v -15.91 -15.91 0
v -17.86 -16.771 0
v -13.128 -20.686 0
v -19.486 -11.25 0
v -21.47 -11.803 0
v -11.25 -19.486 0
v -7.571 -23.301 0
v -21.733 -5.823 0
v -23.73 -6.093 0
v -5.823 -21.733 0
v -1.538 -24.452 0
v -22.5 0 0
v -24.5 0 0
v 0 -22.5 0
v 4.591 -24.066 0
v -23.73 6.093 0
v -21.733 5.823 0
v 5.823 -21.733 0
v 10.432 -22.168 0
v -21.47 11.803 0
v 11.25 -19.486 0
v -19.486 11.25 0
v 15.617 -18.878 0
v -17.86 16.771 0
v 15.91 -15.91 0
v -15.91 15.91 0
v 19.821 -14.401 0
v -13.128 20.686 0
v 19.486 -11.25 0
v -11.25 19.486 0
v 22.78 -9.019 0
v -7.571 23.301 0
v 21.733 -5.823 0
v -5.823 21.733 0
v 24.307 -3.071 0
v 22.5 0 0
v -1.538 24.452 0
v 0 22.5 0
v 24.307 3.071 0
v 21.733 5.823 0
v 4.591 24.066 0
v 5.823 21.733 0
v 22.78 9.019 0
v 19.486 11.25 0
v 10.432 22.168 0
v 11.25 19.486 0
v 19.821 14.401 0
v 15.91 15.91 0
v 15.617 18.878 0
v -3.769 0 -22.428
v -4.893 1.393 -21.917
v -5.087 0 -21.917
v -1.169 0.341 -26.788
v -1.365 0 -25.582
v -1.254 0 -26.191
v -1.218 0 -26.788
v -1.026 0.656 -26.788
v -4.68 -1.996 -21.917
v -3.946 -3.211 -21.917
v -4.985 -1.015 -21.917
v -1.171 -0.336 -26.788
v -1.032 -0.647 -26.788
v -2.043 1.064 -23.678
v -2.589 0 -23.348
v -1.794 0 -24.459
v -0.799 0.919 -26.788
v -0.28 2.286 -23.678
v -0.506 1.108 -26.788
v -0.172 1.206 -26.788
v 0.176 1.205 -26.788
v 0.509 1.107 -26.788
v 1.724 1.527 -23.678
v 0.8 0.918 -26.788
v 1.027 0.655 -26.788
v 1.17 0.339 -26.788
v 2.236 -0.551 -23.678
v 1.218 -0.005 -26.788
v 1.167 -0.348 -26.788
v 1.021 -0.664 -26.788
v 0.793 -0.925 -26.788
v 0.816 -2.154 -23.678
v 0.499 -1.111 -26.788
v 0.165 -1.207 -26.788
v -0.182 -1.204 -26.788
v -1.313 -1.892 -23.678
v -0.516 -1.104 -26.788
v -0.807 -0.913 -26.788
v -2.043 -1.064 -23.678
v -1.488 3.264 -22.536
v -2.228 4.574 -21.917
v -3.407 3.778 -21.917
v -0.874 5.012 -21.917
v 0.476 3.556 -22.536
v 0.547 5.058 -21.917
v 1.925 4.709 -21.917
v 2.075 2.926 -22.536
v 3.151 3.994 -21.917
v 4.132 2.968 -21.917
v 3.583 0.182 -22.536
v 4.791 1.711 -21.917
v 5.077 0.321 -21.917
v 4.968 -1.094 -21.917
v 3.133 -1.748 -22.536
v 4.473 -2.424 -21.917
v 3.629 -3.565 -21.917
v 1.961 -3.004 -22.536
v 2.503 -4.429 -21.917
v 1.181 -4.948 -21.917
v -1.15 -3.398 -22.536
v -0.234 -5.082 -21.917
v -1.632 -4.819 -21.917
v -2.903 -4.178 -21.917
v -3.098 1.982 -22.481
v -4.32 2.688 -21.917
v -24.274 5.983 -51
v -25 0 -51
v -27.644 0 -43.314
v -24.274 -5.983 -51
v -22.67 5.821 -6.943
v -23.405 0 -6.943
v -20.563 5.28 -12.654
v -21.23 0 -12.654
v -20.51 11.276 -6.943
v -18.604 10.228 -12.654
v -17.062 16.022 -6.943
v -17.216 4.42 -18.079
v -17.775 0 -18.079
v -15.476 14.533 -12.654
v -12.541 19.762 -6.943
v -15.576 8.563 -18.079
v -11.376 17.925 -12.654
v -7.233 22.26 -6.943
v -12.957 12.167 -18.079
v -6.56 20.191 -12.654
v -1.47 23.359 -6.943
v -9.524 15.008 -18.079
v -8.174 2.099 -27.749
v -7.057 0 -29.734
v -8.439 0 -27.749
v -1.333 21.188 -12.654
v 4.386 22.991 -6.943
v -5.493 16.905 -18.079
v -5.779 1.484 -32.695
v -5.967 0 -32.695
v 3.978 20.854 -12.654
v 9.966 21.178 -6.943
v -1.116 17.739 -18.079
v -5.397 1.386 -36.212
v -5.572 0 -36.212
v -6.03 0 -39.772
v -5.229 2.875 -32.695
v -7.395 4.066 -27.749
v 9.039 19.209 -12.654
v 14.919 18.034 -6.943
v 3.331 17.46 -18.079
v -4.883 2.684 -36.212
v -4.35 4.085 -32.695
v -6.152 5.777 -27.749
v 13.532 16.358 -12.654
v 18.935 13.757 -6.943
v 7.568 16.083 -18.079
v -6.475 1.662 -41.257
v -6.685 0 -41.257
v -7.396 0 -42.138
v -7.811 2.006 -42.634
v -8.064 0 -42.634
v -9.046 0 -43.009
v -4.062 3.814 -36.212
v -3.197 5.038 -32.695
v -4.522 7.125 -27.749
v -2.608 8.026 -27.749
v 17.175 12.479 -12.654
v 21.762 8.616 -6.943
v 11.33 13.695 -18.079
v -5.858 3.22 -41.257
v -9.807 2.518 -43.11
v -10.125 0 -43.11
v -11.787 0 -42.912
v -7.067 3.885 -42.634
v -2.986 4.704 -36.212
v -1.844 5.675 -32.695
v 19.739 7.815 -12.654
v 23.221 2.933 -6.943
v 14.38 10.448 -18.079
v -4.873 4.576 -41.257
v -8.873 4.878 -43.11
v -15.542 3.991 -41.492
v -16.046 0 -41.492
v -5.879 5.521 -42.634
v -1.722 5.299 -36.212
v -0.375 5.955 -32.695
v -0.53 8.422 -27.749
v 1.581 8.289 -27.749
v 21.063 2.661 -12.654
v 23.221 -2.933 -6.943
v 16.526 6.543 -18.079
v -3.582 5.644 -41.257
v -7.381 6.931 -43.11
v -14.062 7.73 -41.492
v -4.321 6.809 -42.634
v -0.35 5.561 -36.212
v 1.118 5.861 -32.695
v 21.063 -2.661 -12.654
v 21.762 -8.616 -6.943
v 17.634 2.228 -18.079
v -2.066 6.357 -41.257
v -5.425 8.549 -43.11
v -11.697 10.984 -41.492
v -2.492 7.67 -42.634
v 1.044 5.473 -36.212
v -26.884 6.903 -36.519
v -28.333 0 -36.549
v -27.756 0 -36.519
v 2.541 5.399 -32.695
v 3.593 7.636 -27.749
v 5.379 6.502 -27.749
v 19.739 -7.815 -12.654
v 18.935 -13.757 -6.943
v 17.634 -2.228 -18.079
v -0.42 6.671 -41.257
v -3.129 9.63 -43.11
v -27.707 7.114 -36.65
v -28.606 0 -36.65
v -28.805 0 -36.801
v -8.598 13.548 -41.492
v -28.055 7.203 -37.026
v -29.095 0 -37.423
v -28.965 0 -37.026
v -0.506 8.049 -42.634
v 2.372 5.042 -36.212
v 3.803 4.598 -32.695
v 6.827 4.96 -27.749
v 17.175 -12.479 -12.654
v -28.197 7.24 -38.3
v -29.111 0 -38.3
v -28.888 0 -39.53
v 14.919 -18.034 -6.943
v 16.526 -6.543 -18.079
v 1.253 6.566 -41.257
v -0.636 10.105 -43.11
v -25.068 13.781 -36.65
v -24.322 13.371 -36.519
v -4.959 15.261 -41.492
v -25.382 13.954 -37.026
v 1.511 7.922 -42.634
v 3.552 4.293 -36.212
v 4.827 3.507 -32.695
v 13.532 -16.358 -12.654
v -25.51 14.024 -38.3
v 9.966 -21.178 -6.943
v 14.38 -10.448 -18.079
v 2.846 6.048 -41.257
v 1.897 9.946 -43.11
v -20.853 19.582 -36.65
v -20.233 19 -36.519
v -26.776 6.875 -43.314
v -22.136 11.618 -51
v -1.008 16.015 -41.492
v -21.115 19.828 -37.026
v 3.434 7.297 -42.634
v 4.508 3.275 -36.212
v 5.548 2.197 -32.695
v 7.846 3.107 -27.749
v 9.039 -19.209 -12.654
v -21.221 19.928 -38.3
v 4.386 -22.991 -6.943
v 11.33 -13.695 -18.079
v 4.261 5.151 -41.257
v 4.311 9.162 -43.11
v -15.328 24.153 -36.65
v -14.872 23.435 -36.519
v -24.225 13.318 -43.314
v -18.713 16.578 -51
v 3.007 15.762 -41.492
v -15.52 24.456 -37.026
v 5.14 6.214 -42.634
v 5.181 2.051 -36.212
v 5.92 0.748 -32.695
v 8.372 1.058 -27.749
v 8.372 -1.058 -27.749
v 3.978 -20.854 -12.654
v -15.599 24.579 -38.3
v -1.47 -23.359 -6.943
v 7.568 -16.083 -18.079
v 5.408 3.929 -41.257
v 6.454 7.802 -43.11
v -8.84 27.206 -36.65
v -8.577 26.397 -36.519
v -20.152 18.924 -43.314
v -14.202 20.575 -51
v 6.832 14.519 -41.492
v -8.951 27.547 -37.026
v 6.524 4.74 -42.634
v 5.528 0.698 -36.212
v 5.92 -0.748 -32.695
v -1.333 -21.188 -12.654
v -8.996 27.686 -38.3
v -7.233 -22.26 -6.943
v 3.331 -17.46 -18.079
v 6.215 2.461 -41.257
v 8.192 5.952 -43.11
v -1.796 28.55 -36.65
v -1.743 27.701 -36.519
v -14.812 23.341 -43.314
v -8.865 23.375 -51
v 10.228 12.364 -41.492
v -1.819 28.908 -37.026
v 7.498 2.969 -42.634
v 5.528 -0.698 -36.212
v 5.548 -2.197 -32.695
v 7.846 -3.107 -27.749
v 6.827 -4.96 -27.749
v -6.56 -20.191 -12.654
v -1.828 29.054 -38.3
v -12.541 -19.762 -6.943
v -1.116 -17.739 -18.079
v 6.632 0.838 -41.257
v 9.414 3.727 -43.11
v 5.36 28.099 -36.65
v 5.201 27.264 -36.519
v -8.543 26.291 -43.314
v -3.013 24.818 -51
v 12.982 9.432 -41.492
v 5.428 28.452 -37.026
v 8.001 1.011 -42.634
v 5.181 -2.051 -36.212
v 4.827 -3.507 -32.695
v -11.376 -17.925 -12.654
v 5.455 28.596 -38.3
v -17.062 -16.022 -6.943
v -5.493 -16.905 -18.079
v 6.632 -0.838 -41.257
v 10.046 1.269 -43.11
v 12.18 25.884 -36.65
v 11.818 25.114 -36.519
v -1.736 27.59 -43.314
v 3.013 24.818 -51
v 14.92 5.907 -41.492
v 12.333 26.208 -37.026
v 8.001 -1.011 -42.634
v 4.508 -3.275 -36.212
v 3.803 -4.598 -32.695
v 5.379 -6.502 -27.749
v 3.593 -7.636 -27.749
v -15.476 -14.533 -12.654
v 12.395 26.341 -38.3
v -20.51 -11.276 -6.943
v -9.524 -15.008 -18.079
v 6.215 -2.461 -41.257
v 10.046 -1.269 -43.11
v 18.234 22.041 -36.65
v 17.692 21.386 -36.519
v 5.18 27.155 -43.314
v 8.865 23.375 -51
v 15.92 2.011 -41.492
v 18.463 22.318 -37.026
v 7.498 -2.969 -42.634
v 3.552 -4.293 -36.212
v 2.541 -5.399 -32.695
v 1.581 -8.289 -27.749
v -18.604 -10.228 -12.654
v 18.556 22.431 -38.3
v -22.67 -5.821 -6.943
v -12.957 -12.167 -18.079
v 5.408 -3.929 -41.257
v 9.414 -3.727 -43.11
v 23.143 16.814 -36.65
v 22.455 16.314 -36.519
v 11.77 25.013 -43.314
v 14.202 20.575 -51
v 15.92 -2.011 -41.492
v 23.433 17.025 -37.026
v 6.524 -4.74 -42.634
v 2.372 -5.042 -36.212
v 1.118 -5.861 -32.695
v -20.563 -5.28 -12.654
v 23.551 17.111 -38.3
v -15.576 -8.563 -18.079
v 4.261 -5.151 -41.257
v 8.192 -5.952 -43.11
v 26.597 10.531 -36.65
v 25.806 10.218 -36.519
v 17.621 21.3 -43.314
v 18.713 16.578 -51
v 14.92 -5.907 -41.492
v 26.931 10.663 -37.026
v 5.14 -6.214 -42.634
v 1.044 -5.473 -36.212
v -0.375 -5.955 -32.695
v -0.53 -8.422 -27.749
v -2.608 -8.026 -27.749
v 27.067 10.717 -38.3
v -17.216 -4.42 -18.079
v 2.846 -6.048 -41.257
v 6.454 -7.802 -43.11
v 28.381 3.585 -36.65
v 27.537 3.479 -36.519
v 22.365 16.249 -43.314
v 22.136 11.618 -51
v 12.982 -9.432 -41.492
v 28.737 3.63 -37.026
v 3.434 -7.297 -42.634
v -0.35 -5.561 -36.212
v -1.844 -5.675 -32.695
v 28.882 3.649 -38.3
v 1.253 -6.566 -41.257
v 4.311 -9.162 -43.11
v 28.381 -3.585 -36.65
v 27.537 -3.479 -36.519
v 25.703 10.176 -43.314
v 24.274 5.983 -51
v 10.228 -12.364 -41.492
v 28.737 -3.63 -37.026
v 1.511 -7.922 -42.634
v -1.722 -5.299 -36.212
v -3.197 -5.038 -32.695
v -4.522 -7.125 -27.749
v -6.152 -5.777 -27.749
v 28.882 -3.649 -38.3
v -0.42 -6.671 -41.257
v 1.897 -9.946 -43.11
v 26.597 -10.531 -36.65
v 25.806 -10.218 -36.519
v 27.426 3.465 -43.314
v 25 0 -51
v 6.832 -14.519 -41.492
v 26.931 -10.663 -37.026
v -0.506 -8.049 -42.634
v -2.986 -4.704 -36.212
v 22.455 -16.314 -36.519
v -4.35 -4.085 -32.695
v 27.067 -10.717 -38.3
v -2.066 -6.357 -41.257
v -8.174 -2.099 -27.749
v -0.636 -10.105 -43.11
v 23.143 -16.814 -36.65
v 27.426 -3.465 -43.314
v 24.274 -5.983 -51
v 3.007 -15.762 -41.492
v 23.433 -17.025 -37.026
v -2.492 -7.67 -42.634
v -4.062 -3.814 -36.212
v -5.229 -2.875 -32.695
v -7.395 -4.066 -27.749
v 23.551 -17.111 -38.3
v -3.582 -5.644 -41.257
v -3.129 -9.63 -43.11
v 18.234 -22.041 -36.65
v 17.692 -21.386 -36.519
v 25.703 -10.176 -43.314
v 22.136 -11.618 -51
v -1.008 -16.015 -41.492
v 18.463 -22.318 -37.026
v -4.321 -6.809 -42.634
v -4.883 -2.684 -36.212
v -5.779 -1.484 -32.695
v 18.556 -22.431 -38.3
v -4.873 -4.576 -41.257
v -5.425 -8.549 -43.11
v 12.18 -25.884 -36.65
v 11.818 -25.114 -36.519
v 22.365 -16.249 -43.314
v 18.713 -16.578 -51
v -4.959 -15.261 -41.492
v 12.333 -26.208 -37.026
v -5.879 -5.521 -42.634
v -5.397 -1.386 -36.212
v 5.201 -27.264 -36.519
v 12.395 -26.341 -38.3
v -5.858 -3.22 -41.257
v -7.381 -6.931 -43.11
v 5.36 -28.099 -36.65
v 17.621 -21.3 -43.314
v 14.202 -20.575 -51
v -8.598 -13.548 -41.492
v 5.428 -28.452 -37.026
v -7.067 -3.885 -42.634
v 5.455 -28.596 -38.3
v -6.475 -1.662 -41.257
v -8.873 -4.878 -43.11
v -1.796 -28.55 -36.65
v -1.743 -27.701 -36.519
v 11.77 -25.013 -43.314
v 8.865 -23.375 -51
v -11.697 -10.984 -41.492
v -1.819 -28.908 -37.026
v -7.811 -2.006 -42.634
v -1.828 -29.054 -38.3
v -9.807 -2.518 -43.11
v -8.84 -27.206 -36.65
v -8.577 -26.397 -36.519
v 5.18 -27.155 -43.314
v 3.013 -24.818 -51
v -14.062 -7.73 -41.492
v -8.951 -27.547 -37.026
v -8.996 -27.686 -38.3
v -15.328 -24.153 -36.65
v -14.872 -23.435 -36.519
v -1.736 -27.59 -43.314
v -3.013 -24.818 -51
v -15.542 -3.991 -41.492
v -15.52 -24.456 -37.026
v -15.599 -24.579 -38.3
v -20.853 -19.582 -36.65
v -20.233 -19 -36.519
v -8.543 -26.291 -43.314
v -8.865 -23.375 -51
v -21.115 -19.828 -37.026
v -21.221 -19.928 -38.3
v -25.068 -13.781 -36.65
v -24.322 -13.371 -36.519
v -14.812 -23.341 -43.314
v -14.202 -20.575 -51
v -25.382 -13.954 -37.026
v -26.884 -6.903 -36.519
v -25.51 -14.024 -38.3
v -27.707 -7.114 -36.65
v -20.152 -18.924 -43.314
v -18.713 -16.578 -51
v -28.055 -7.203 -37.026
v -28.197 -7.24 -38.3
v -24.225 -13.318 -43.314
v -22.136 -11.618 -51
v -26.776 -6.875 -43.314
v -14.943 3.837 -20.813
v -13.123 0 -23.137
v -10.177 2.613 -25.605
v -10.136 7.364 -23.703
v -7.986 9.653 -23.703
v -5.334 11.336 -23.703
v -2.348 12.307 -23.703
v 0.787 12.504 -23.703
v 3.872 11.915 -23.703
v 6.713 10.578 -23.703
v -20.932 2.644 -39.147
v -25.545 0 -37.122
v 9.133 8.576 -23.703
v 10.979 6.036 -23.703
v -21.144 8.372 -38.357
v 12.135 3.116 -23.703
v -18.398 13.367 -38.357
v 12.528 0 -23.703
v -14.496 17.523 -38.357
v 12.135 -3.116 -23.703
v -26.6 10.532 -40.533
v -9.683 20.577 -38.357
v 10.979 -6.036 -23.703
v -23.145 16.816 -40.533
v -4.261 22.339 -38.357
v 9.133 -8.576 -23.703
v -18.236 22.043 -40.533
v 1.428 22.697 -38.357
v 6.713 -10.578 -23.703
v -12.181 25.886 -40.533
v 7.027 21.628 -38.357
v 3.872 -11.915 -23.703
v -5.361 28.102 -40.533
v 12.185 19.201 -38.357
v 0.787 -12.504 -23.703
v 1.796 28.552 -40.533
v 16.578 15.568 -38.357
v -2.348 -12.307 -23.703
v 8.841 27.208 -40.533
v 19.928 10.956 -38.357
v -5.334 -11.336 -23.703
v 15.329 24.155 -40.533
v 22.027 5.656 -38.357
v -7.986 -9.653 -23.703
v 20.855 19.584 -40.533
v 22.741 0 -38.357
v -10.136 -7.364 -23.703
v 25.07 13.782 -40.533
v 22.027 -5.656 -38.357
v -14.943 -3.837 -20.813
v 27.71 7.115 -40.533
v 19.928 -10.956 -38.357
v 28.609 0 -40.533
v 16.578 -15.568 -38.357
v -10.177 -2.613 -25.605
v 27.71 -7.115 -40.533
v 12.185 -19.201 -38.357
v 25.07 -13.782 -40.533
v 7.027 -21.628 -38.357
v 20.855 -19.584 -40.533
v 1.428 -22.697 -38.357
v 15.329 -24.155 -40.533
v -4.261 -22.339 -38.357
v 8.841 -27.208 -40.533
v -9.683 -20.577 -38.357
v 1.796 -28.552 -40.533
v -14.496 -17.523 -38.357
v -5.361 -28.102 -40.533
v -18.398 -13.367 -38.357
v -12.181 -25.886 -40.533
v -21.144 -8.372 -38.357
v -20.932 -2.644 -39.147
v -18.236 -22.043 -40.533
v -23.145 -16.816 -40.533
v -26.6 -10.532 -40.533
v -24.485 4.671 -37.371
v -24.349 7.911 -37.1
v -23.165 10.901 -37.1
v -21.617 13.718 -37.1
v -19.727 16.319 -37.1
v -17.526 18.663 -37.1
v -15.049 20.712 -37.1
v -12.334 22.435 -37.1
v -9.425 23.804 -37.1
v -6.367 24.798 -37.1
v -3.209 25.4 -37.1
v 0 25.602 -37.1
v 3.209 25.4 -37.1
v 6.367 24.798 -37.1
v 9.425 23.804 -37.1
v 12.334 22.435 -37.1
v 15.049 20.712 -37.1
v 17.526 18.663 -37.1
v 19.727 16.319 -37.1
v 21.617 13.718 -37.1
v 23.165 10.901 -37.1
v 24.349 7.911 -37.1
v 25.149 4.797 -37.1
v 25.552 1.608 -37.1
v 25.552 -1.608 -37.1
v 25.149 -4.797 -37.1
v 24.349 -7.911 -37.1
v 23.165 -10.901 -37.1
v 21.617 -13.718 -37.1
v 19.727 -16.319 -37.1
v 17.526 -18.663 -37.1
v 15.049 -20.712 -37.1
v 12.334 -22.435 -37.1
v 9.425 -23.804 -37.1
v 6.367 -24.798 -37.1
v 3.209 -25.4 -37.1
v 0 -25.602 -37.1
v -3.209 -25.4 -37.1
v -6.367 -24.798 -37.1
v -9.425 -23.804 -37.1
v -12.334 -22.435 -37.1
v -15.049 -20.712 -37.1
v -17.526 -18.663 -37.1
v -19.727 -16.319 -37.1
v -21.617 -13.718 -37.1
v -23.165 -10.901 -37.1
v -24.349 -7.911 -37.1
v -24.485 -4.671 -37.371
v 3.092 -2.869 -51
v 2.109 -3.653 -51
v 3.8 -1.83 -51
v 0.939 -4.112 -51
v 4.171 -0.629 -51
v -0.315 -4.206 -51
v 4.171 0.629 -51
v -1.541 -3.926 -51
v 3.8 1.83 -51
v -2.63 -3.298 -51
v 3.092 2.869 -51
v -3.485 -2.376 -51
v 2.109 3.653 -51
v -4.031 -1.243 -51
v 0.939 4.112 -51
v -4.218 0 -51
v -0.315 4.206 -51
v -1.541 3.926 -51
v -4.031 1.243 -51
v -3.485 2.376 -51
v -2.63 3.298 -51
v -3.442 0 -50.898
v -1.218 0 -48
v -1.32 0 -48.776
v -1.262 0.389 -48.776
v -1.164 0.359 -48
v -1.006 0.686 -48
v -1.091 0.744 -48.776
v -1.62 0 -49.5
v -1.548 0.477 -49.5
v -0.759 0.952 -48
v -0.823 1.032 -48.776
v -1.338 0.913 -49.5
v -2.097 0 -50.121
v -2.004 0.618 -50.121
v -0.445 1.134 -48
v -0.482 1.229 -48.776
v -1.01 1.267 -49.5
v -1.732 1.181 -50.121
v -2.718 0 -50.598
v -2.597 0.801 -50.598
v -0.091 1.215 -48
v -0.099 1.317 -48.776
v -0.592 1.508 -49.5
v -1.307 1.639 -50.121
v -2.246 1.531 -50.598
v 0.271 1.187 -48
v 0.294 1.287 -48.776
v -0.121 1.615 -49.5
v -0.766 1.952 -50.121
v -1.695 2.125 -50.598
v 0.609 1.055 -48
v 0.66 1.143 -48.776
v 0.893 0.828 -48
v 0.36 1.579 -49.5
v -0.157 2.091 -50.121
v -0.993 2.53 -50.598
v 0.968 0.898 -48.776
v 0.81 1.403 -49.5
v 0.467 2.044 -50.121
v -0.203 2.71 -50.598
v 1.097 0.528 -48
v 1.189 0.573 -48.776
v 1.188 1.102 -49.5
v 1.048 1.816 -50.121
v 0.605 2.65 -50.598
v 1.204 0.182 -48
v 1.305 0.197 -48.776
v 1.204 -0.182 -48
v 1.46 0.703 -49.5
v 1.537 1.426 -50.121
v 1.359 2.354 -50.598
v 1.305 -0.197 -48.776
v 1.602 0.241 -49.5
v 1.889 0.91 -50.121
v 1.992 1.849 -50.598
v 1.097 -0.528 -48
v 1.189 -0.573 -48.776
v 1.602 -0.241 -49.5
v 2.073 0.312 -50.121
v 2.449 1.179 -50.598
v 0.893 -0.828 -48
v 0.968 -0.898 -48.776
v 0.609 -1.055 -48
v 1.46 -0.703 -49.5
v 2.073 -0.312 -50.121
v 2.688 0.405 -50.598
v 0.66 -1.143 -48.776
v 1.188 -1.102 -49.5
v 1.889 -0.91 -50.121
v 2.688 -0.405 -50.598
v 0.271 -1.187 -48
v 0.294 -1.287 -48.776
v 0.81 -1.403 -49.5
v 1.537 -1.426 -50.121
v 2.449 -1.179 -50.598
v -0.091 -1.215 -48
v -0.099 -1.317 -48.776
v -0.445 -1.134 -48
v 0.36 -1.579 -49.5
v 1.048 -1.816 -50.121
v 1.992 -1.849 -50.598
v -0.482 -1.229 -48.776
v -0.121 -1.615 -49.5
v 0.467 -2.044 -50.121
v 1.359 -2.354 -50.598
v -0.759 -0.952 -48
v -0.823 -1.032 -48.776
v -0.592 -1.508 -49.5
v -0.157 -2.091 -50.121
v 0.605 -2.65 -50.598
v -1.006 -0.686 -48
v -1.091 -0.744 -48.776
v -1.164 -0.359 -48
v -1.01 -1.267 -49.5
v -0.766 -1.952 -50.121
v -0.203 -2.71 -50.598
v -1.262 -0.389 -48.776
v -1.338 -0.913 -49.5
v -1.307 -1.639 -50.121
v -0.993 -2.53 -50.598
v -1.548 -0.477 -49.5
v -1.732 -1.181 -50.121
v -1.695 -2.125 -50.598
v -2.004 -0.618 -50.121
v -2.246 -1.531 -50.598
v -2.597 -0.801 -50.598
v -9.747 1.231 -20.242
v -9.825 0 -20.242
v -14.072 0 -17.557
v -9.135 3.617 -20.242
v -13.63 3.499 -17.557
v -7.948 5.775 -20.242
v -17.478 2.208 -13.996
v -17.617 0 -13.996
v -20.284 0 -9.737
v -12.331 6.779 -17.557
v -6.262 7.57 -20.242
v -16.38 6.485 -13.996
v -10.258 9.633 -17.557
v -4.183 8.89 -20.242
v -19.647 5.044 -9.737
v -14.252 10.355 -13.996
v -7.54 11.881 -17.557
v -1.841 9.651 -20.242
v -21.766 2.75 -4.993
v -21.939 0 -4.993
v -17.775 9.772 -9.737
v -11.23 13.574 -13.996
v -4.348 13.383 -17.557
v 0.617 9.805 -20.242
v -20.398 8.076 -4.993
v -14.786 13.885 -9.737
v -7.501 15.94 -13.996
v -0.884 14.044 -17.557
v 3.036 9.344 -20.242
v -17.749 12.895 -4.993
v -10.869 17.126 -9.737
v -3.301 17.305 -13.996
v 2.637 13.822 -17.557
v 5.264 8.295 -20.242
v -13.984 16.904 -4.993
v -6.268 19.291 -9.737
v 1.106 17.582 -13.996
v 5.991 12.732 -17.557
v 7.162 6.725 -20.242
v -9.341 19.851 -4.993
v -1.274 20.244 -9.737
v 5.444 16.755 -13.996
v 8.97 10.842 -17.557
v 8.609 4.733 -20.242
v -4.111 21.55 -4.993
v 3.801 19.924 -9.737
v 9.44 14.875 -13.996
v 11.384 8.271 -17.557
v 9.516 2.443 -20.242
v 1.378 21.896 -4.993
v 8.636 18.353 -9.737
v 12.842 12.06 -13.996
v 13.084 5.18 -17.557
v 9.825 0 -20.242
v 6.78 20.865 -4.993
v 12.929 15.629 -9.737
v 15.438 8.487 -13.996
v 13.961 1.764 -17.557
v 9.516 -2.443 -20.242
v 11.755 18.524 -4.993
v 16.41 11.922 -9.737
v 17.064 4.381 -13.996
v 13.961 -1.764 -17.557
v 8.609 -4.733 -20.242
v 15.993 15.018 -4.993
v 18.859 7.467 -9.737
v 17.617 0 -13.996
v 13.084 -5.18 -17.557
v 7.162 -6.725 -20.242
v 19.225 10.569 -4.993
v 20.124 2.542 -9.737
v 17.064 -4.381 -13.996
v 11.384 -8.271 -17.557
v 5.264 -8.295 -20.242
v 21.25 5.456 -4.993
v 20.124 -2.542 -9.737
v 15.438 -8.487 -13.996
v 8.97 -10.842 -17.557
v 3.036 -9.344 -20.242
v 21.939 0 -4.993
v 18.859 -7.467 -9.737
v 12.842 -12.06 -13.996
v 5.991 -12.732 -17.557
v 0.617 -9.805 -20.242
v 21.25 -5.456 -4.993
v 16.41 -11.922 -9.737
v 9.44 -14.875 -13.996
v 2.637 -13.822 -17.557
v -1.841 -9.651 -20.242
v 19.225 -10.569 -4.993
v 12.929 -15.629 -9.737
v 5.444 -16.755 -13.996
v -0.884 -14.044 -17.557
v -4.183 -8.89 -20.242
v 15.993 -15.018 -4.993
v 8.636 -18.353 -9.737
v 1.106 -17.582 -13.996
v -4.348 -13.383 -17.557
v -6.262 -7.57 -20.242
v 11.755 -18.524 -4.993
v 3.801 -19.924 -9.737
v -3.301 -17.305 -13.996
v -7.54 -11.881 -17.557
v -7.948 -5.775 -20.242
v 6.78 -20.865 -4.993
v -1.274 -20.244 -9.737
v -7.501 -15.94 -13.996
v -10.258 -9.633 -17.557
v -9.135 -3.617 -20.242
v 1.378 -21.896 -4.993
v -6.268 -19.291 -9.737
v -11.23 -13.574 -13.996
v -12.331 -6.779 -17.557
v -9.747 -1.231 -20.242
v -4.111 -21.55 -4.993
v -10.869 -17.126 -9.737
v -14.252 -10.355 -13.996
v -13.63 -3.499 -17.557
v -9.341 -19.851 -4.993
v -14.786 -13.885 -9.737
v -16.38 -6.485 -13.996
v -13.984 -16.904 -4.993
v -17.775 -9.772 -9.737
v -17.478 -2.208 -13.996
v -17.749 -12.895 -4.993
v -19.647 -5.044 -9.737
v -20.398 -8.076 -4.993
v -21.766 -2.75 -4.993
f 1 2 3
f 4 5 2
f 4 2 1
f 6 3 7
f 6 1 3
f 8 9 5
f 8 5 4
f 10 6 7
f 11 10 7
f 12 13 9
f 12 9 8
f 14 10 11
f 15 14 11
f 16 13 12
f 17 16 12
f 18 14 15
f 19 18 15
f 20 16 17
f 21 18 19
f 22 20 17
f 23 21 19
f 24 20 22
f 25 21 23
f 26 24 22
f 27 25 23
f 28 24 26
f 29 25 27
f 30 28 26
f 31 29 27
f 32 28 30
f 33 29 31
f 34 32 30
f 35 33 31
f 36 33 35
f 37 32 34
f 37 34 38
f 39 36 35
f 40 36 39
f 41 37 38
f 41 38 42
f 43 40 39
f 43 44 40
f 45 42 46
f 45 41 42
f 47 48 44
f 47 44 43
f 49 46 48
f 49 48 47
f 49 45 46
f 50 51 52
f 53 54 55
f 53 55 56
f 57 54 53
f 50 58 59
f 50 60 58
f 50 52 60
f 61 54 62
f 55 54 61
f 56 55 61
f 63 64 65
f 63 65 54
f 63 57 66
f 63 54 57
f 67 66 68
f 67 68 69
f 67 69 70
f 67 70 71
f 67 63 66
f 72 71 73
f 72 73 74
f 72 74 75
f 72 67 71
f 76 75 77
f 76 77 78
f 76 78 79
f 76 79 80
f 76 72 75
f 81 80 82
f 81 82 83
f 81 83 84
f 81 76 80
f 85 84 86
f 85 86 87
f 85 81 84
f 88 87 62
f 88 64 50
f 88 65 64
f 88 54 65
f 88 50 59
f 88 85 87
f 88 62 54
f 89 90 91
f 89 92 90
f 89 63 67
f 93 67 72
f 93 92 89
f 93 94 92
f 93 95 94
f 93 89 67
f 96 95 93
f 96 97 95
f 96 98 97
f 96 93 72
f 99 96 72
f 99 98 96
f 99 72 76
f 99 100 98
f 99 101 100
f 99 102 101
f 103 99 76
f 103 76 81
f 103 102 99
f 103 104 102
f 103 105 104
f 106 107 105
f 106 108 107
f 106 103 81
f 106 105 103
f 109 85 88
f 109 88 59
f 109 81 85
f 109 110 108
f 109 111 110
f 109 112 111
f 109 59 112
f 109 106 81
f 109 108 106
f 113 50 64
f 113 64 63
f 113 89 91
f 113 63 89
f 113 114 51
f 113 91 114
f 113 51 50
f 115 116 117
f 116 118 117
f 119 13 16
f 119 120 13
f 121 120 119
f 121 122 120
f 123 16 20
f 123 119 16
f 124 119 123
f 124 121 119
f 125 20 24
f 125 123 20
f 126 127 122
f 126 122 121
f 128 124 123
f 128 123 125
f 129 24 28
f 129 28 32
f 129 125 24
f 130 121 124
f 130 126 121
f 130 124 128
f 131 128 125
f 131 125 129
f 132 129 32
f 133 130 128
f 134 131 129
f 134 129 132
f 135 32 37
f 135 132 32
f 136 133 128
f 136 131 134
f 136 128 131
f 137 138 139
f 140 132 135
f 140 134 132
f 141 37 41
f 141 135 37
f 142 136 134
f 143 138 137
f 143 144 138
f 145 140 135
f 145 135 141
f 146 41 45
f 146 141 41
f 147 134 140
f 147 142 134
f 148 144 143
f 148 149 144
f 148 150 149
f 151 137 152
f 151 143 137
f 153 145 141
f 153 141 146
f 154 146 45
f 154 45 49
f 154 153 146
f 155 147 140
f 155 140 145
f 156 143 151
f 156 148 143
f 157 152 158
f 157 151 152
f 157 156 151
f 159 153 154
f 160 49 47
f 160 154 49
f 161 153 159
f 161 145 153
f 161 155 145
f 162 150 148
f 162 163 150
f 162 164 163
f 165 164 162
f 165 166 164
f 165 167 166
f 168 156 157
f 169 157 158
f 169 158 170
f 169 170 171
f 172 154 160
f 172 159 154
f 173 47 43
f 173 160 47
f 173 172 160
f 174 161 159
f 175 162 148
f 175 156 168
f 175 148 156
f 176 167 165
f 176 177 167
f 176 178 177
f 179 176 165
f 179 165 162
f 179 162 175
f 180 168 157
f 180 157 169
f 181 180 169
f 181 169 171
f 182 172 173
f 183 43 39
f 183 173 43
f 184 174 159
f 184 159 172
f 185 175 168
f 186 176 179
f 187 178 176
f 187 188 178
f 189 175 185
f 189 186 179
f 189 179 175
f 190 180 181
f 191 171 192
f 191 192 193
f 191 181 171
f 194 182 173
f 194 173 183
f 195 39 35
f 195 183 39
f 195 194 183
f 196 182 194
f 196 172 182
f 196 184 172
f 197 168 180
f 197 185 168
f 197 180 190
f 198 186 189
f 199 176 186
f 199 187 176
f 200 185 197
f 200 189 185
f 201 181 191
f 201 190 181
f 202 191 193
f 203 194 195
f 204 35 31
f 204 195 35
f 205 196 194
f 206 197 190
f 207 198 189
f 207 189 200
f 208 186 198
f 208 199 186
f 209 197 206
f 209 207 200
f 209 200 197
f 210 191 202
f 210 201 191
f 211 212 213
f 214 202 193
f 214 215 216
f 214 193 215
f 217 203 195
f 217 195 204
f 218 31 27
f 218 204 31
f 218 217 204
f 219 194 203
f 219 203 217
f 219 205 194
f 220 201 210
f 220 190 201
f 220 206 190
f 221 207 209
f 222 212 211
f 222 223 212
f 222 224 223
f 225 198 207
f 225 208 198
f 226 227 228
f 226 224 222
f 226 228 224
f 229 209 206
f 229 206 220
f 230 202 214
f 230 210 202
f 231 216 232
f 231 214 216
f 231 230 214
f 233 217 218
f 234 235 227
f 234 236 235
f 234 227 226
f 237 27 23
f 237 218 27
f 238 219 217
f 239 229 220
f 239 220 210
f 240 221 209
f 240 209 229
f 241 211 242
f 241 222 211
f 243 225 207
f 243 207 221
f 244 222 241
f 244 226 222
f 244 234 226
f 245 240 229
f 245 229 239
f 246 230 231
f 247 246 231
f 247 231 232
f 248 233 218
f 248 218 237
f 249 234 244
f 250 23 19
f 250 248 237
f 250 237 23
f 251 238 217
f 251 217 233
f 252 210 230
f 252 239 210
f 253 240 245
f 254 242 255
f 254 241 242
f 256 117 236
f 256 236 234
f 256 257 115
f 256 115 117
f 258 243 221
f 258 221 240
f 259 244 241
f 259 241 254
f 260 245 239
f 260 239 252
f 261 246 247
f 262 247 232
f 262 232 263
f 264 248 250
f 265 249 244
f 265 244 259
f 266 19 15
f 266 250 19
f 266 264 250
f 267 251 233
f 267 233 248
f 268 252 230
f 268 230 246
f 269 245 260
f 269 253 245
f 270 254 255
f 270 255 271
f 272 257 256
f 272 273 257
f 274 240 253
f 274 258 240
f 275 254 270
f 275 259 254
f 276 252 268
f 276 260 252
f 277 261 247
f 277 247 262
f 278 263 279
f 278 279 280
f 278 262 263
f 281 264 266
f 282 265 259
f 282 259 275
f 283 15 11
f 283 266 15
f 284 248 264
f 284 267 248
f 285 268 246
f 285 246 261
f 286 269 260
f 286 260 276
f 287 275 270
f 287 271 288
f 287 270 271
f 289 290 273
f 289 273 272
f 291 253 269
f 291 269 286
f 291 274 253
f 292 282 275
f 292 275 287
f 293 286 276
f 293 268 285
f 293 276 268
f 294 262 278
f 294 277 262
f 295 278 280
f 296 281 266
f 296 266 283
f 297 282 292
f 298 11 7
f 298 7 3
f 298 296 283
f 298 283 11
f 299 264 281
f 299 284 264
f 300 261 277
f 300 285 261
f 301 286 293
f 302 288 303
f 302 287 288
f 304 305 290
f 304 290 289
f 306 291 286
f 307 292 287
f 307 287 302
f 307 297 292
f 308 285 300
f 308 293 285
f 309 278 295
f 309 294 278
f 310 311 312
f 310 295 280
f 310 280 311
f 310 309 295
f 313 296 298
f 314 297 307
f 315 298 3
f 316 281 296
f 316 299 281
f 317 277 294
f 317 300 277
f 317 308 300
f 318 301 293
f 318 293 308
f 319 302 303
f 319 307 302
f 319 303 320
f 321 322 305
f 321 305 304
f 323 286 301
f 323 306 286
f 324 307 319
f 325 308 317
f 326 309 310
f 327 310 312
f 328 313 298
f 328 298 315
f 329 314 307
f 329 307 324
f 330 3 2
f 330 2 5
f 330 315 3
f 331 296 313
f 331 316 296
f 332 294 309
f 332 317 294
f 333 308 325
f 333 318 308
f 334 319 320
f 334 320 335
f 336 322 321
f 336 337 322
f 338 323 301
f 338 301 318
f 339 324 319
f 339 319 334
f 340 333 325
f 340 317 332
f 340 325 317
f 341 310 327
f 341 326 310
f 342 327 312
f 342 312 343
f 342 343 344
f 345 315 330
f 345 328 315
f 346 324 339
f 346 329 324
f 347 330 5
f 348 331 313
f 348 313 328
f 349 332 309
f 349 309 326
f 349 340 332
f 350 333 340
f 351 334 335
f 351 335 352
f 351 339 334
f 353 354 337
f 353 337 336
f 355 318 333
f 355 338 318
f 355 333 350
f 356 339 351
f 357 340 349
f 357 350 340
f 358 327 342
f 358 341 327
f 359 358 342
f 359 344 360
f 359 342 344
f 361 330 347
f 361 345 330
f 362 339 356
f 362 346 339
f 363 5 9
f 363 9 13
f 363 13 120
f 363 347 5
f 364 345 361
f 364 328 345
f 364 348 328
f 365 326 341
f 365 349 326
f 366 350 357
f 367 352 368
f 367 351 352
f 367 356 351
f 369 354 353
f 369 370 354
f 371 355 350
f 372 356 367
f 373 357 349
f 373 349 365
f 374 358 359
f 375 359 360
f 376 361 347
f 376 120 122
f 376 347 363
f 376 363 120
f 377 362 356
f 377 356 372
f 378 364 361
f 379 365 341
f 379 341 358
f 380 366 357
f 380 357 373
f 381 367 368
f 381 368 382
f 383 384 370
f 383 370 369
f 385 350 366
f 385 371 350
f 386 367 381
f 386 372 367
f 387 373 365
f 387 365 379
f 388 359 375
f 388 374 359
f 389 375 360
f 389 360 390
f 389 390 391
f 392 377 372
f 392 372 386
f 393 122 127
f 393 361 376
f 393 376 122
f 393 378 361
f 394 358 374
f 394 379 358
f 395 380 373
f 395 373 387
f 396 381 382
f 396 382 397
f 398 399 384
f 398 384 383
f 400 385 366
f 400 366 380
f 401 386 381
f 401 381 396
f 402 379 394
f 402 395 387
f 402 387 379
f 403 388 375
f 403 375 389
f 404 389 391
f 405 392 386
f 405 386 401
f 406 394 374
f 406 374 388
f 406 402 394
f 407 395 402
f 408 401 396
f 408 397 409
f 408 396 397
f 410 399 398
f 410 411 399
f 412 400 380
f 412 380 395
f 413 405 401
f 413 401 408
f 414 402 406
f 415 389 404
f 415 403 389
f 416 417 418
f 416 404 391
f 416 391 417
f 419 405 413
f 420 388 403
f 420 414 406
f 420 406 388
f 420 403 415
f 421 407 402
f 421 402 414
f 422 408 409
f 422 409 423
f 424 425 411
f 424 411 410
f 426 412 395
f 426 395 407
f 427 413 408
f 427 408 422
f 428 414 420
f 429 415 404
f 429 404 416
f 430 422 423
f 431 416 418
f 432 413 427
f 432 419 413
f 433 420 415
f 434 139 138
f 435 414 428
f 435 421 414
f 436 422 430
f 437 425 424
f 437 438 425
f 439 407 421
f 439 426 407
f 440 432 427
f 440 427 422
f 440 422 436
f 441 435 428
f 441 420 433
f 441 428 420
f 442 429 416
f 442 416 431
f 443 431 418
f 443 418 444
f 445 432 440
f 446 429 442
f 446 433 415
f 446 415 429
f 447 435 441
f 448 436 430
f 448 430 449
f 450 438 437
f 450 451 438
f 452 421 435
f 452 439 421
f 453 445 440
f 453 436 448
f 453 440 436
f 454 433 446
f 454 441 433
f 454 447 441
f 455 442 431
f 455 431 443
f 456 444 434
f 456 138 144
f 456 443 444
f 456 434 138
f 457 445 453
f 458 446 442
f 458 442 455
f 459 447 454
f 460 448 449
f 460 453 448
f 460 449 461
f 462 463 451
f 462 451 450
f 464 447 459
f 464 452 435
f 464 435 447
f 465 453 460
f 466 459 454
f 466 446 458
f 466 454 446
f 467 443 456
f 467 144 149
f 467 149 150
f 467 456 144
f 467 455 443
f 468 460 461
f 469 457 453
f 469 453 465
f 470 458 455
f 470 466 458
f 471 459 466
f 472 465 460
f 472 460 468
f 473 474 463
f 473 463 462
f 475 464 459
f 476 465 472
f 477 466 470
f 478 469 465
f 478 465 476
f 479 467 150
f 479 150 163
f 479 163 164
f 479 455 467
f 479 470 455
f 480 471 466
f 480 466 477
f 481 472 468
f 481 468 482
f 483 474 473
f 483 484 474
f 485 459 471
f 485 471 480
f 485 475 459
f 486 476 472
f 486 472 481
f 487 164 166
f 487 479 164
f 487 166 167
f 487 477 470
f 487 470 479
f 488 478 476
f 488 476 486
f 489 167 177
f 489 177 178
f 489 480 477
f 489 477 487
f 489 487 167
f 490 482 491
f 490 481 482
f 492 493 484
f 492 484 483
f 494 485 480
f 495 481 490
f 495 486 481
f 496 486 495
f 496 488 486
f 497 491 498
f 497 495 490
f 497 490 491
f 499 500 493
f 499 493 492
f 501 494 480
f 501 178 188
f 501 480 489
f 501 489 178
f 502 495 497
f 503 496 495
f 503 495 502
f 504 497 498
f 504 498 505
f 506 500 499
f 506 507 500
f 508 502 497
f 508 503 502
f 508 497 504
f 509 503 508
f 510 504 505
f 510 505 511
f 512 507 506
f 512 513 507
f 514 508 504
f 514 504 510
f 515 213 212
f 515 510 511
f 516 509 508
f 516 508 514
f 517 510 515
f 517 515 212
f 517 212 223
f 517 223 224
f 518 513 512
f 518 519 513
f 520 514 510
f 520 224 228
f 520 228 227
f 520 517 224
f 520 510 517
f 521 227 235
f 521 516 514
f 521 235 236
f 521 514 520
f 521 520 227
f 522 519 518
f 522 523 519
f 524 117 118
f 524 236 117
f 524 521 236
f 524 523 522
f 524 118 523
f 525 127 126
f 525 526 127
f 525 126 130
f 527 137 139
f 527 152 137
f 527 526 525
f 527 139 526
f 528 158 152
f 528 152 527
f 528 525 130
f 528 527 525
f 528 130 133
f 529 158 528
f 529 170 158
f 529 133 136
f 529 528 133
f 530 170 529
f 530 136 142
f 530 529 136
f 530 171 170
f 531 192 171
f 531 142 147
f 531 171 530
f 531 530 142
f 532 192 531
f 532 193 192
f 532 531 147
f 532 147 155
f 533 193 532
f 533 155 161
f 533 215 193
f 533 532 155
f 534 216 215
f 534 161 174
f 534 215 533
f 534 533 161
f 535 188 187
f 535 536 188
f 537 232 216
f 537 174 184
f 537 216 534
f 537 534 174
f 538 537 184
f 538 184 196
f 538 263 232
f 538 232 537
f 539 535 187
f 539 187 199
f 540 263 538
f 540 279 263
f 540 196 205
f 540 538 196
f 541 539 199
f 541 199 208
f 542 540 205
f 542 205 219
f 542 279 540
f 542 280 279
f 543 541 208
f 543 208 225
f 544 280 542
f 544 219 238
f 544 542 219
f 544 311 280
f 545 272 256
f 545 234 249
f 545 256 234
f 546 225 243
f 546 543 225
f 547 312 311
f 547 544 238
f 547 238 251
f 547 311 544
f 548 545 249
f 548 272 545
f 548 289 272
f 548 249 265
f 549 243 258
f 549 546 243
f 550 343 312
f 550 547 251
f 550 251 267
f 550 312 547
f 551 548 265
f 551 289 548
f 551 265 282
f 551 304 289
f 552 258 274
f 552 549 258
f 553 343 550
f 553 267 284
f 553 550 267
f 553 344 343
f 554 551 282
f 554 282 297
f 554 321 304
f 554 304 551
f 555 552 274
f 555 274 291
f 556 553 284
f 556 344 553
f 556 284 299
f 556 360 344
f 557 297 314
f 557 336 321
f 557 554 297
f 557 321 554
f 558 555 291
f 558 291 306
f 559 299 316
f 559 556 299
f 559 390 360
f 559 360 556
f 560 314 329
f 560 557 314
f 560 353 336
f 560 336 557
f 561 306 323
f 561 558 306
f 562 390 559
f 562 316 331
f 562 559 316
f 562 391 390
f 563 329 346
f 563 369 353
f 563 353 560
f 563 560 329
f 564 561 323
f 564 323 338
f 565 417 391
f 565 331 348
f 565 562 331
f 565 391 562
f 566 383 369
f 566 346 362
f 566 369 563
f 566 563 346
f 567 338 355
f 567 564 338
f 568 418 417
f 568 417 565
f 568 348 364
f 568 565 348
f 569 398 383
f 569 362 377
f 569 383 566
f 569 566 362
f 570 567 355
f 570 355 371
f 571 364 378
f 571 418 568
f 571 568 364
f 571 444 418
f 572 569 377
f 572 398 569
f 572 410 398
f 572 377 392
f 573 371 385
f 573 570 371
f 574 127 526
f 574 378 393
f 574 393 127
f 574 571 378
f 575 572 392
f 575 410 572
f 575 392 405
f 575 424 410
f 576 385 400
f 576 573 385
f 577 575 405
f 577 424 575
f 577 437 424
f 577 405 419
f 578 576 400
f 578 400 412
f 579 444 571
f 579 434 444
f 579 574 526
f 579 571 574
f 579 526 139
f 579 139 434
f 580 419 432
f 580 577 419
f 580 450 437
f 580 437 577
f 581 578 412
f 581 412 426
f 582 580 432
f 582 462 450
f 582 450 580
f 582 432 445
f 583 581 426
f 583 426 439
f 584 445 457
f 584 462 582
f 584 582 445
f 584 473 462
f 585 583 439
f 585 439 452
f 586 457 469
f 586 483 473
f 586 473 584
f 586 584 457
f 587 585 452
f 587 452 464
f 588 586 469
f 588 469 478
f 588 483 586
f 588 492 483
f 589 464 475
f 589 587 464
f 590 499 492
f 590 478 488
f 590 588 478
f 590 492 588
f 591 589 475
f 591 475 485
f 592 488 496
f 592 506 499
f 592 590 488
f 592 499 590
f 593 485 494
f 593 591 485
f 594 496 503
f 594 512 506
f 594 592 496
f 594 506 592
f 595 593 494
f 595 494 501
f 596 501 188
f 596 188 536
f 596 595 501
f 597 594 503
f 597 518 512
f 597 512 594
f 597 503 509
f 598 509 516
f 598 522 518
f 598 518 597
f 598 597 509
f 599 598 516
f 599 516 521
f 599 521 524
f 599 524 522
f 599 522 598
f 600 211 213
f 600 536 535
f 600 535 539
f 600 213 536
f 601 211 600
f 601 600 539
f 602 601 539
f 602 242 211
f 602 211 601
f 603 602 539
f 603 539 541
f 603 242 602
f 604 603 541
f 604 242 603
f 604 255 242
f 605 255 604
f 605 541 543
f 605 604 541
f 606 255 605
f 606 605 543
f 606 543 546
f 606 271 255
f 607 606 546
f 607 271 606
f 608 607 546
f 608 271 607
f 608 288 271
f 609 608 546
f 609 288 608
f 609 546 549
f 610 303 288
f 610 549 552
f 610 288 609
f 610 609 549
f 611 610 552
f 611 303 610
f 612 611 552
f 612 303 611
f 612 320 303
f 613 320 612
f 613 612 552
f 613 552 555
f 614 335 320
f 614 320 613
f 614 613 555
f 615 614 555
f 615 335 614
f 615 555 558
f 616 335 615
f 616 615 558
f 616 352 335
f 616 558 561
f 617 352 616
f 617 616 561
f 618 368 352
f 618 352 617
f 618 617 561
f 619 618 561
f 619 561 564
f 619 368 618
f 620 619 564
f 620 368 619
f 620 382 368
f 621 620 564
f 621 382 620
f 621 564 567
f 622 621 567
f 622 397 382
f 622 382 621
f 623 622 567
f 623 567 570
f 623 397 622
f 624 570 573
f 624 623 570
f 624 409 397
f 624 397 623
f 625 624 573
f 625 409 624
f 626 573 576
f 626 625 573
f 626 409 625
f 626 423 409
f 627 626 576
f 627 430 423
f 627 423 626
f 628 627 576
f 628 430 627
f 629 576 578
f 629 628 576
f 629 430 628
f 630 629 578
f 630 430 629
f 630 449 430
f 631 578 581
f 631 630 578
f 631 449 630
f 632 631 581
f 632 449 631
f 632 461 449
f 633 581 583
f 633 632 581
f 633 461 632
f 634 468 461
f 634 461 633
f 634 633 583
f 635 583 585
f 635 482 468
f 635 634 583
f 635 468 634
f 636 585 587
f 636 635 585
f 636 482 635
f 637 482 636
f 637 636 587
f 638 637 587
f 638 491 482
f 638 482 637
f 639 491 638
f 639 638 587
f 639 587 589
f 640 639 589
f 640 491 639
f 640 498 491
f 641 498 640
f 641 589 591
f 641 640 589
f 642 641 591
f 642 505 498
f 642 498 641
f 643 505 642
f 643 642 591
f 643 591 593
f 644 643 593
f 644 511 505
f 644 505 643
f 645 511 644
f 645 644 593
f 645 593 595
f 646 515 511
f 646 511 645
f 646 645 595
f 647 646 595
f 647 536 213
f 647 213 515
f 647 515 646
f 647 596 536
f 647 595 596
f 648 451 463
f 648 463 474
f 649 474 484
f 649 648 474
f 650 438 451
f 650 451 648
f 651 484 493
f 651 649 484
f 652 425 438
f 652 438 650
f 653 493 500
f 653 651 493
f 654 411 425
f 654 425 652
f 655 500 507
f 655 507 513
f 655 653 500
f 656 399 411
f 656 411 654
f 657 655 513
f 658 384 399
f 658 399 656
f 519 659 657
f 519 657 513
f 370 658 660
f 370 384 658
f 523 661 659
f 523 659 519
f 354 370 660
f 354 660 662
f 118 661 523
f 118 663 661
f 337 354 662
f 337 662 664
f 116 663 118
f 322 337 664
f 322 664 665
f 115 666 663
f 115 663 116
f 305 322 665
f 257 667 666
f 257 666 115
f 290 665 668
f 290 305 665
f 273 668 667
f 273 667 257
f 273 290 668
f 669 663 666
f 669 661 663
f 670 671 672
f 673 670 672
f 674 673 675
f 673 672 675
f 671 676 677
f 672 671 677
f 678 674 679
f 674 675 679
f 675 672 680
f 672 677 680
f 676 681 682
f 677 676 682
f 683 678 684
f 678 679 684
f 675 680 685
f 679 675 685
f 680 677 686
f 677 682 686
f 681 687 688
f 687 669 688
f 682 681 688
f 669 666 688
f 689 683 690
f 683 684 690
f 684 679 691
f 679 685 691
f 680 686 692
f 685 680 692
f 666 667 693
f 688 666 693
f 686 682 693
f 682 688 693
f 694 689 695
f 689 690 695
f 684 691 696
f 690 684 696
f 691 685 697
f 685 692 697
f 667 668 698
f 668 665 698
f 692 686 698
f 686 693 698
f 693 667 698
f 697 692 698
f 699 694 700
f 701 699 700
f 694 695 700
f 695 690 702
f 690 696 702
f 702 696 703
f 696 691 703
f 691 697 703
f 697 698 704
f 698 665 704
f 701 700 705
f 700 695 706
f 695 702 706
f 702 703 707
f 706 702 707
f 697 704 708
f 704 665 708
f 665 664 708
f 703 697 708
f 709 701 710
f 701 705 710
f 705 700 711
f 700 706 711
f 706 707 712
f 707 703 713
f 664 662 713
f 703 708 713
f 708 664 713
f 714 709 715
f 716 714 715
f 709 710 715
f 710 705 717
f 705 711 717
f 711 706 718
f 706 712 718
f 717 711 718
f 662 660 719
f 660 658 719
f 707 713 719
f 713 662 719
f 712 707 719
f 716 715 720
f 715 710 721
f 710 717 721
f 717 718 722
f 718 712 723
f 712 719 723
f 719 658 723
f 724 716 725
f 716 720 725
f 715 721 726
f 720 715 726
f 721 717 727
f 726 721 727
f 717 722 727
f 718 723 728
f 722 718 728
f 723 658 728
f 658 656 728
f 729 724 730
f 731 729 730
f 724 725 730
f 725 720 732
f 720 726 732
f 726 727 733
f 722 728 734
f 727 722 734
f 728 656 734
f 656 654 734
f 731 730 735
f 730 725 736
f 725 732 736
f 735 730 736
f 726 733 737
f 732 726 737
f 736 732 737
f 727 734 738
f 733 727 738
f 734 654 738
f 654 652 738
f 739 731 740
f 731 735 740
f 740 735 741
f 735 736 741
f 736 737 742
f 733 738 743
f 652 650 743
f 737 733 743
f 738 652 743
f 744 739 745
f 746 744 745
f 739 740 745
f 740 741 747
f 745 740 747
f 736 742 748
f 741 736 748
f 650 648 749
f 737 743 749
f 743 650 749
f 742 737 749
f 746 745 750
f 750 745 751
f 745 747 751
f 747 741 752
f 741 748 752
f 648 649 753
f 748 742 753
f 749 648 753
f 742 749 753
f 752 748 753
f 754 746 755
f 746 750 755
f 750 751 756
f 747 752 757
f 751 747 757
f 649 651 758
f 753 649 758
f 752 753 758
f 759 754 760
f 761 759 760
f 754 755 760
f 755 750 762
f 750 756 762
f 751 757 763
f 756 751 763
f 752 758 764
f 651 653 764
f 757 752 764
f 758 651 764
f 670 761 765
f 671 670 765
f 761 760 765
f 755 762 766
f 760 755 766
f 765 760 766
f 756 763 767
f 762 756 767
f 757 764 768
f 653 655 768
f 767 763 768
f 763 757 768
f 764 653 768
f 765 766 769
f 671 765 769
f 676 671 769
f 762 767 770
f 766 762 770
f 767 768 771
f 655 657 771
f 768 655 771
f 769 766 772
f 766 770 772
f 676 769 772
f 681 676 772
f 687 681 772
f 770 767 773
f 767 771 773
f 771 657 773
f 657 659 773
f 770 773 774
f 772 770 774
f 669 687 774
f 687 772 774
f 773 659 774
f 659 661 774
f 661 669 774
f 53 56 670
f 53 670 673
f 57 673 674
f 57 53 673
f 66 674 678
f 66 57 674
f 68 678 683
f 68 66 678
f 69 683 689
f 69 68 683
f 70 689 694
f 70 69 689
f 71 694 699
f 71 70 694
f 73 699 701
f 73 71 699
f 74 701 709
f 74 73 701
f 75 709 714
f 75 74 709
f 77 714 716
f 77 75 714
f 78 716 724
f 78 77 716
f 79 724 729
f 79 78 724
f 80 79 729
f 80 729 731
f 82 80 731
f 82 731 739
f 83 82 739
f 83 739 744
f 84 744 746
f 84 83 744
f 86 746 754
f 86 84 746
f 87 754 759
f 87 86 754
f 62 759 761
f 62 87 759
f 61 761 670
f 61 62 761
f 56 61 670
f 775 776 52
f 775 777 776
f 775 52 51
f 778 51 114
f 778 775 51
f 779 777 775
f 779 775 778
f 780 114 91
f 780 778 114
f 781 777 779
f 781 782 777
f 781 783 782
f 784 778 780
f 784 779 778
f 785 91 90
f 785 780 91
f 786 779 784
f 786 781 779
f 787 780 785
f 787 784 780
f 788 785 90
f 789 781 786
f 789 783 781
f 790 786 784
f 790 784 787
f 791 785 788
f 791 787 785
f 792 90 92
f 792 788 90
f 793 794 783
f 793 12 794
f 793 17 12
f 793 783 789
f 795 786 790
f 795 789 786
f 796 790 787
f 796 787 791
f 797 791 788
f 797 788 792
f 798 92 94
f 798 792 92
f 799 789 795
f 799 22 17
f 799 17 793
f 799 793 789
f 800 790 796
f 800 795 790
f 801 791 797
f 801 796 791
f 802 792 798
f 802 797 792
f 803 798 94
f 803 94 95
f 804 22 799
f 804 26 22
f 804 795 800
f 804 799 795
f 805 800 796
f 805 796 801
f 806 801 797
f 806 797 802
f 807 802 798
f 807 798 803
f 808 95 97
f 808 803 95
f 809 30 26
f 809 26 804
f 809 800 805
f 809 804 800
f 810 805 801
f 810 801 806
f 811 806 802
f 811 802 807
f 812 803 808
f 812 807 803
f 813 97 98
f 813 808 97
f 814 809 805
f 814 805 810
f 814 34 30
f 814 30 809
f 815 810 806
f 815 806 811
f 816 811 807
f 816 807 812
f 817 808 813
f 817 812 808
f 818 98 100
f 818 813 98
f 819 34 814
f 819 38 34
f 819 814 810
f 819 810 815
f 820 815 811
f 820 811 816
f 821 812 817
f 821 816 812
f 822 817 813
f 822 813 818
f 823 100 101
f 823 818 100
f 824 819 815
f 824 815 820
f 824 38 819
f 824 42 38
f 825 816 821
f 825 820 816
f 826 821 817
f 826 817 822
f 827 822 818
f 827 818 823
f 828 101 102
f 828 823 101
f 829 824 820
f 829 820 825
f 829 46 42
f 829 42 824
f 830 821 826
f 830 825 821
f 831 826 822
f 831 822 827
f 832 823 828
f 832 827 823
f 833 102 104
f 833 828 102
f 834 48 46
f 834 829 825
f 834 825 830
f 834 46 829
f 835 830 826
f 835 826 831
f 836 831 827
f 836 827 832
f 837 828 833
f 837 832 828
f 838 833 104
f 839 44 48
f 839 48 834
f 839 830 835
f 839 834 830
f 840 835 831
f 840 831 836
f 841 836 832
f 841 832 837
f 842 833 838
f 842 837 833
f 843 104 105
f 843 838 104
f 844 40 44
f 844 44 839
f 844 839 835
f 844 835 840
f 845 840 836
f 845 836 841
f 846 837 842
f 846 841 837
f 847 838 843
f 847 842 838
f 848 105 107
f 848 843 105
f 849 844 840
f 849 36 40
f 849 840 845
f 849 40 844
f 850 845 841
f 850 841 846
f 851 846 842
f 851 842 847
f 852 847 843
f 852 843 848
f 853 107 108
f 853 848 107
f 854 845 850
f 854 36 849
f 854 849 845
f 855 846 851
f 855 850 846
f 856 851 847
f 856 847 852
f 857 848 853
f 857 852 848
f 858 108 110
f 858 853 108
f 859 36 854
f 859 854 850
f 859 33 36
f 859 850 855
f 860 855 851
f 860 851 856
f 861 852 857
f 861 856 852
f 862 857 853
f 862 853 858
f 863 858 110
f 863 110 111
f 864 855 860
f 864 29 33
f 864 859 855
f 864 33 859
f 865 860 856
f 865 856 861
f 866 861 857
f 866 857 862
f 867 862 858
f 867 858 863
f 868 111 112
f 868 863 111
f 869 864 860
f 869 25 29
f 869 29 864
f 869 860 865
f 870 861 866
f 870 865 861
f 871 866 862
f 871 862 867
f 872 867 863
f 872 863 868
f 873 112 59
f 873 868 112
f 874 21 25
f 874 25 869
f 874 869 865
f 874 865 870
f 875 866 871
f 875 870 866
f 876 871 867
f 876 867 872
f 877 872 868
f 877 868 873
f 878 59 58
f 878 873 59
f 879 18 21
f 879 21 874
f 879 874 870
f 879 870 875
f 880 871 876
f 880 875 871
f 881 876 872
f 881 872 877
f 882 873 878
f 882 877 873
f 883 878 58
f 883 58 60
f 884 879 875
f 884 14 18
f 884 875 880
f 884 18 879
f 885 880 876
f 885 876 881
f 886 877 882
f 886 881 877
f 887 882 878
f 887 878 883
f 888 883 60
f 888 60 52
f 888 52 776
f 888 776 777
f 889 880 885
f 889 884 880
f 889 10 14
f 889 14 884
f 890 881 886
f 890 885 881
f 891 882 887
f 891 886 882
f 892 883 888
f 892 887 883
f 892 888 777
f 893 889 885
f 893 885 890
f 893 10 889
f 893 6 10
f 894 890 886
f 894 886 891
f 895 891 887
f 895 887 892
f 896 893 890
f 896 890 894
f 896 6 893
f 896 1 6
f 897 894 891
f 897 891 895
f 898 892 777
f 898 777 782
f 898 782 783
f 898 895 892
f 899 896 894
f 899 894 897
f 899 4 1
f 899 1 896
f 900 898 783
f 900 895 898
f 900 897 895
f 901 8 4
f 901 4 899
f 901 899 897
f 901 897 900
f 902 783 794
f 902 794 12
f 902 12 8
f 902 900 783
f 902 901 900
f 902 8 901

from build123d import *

# Parameters (mm, degrees)
F2_R = 5
F3_R = 3


with BuildPart() as f1:
    # F0 (on Front) → F1 (revolve)
    with BuildSketch(Plane.XZ):
        with BuildLine():
            ThreePointArc((-1.2180203755, -22.467007508), (-16.3348623877, -15.4732760195), (-22.5, 0))
            Line((-22.5, 0), (-24.5, 0))
            add(Edge.make_bspline(
                [(-24.5, 0), (-23.739777559, -13.6950002435), (-11.2830044037, -24.5647469092), (-4.8658456215, -31.2678632632), (-5.841536902, -50.1868893047), (-35.8610158663, -28.2577643873), (-26.3574018445, -45.4443305215), (-25, -51)],
                knots=[0, 0, 0, 0, 0.2663608368, 0.4191266938, 0.5820497943, 0.8077483959, 1, 1, 1, 1], degree=3))
            Line((-25, -51), (-1.2180203755, -51))
            Line((-1.2180203755, -51), (-1.2180203755, -22.467007508))
        make_face()
    revolve(axis=Axis((0, 0, -25.5), (0, 0, -1)))

    # F2
    f2_edges = [f1.edges().sort_by_distance(p)[0] for p in [
        (1.21802, 0, -22.467008),
    ]]
    fillet(f2_edges, radius=F2_R)

    # F3
    f3_edges = [f1.edges().sort_by_distance(p)[0] for p in [
        (1.21802, 0, -51),
    ]]
    fillet(f3_edges, radius=F3_R)


solid = f1.part
